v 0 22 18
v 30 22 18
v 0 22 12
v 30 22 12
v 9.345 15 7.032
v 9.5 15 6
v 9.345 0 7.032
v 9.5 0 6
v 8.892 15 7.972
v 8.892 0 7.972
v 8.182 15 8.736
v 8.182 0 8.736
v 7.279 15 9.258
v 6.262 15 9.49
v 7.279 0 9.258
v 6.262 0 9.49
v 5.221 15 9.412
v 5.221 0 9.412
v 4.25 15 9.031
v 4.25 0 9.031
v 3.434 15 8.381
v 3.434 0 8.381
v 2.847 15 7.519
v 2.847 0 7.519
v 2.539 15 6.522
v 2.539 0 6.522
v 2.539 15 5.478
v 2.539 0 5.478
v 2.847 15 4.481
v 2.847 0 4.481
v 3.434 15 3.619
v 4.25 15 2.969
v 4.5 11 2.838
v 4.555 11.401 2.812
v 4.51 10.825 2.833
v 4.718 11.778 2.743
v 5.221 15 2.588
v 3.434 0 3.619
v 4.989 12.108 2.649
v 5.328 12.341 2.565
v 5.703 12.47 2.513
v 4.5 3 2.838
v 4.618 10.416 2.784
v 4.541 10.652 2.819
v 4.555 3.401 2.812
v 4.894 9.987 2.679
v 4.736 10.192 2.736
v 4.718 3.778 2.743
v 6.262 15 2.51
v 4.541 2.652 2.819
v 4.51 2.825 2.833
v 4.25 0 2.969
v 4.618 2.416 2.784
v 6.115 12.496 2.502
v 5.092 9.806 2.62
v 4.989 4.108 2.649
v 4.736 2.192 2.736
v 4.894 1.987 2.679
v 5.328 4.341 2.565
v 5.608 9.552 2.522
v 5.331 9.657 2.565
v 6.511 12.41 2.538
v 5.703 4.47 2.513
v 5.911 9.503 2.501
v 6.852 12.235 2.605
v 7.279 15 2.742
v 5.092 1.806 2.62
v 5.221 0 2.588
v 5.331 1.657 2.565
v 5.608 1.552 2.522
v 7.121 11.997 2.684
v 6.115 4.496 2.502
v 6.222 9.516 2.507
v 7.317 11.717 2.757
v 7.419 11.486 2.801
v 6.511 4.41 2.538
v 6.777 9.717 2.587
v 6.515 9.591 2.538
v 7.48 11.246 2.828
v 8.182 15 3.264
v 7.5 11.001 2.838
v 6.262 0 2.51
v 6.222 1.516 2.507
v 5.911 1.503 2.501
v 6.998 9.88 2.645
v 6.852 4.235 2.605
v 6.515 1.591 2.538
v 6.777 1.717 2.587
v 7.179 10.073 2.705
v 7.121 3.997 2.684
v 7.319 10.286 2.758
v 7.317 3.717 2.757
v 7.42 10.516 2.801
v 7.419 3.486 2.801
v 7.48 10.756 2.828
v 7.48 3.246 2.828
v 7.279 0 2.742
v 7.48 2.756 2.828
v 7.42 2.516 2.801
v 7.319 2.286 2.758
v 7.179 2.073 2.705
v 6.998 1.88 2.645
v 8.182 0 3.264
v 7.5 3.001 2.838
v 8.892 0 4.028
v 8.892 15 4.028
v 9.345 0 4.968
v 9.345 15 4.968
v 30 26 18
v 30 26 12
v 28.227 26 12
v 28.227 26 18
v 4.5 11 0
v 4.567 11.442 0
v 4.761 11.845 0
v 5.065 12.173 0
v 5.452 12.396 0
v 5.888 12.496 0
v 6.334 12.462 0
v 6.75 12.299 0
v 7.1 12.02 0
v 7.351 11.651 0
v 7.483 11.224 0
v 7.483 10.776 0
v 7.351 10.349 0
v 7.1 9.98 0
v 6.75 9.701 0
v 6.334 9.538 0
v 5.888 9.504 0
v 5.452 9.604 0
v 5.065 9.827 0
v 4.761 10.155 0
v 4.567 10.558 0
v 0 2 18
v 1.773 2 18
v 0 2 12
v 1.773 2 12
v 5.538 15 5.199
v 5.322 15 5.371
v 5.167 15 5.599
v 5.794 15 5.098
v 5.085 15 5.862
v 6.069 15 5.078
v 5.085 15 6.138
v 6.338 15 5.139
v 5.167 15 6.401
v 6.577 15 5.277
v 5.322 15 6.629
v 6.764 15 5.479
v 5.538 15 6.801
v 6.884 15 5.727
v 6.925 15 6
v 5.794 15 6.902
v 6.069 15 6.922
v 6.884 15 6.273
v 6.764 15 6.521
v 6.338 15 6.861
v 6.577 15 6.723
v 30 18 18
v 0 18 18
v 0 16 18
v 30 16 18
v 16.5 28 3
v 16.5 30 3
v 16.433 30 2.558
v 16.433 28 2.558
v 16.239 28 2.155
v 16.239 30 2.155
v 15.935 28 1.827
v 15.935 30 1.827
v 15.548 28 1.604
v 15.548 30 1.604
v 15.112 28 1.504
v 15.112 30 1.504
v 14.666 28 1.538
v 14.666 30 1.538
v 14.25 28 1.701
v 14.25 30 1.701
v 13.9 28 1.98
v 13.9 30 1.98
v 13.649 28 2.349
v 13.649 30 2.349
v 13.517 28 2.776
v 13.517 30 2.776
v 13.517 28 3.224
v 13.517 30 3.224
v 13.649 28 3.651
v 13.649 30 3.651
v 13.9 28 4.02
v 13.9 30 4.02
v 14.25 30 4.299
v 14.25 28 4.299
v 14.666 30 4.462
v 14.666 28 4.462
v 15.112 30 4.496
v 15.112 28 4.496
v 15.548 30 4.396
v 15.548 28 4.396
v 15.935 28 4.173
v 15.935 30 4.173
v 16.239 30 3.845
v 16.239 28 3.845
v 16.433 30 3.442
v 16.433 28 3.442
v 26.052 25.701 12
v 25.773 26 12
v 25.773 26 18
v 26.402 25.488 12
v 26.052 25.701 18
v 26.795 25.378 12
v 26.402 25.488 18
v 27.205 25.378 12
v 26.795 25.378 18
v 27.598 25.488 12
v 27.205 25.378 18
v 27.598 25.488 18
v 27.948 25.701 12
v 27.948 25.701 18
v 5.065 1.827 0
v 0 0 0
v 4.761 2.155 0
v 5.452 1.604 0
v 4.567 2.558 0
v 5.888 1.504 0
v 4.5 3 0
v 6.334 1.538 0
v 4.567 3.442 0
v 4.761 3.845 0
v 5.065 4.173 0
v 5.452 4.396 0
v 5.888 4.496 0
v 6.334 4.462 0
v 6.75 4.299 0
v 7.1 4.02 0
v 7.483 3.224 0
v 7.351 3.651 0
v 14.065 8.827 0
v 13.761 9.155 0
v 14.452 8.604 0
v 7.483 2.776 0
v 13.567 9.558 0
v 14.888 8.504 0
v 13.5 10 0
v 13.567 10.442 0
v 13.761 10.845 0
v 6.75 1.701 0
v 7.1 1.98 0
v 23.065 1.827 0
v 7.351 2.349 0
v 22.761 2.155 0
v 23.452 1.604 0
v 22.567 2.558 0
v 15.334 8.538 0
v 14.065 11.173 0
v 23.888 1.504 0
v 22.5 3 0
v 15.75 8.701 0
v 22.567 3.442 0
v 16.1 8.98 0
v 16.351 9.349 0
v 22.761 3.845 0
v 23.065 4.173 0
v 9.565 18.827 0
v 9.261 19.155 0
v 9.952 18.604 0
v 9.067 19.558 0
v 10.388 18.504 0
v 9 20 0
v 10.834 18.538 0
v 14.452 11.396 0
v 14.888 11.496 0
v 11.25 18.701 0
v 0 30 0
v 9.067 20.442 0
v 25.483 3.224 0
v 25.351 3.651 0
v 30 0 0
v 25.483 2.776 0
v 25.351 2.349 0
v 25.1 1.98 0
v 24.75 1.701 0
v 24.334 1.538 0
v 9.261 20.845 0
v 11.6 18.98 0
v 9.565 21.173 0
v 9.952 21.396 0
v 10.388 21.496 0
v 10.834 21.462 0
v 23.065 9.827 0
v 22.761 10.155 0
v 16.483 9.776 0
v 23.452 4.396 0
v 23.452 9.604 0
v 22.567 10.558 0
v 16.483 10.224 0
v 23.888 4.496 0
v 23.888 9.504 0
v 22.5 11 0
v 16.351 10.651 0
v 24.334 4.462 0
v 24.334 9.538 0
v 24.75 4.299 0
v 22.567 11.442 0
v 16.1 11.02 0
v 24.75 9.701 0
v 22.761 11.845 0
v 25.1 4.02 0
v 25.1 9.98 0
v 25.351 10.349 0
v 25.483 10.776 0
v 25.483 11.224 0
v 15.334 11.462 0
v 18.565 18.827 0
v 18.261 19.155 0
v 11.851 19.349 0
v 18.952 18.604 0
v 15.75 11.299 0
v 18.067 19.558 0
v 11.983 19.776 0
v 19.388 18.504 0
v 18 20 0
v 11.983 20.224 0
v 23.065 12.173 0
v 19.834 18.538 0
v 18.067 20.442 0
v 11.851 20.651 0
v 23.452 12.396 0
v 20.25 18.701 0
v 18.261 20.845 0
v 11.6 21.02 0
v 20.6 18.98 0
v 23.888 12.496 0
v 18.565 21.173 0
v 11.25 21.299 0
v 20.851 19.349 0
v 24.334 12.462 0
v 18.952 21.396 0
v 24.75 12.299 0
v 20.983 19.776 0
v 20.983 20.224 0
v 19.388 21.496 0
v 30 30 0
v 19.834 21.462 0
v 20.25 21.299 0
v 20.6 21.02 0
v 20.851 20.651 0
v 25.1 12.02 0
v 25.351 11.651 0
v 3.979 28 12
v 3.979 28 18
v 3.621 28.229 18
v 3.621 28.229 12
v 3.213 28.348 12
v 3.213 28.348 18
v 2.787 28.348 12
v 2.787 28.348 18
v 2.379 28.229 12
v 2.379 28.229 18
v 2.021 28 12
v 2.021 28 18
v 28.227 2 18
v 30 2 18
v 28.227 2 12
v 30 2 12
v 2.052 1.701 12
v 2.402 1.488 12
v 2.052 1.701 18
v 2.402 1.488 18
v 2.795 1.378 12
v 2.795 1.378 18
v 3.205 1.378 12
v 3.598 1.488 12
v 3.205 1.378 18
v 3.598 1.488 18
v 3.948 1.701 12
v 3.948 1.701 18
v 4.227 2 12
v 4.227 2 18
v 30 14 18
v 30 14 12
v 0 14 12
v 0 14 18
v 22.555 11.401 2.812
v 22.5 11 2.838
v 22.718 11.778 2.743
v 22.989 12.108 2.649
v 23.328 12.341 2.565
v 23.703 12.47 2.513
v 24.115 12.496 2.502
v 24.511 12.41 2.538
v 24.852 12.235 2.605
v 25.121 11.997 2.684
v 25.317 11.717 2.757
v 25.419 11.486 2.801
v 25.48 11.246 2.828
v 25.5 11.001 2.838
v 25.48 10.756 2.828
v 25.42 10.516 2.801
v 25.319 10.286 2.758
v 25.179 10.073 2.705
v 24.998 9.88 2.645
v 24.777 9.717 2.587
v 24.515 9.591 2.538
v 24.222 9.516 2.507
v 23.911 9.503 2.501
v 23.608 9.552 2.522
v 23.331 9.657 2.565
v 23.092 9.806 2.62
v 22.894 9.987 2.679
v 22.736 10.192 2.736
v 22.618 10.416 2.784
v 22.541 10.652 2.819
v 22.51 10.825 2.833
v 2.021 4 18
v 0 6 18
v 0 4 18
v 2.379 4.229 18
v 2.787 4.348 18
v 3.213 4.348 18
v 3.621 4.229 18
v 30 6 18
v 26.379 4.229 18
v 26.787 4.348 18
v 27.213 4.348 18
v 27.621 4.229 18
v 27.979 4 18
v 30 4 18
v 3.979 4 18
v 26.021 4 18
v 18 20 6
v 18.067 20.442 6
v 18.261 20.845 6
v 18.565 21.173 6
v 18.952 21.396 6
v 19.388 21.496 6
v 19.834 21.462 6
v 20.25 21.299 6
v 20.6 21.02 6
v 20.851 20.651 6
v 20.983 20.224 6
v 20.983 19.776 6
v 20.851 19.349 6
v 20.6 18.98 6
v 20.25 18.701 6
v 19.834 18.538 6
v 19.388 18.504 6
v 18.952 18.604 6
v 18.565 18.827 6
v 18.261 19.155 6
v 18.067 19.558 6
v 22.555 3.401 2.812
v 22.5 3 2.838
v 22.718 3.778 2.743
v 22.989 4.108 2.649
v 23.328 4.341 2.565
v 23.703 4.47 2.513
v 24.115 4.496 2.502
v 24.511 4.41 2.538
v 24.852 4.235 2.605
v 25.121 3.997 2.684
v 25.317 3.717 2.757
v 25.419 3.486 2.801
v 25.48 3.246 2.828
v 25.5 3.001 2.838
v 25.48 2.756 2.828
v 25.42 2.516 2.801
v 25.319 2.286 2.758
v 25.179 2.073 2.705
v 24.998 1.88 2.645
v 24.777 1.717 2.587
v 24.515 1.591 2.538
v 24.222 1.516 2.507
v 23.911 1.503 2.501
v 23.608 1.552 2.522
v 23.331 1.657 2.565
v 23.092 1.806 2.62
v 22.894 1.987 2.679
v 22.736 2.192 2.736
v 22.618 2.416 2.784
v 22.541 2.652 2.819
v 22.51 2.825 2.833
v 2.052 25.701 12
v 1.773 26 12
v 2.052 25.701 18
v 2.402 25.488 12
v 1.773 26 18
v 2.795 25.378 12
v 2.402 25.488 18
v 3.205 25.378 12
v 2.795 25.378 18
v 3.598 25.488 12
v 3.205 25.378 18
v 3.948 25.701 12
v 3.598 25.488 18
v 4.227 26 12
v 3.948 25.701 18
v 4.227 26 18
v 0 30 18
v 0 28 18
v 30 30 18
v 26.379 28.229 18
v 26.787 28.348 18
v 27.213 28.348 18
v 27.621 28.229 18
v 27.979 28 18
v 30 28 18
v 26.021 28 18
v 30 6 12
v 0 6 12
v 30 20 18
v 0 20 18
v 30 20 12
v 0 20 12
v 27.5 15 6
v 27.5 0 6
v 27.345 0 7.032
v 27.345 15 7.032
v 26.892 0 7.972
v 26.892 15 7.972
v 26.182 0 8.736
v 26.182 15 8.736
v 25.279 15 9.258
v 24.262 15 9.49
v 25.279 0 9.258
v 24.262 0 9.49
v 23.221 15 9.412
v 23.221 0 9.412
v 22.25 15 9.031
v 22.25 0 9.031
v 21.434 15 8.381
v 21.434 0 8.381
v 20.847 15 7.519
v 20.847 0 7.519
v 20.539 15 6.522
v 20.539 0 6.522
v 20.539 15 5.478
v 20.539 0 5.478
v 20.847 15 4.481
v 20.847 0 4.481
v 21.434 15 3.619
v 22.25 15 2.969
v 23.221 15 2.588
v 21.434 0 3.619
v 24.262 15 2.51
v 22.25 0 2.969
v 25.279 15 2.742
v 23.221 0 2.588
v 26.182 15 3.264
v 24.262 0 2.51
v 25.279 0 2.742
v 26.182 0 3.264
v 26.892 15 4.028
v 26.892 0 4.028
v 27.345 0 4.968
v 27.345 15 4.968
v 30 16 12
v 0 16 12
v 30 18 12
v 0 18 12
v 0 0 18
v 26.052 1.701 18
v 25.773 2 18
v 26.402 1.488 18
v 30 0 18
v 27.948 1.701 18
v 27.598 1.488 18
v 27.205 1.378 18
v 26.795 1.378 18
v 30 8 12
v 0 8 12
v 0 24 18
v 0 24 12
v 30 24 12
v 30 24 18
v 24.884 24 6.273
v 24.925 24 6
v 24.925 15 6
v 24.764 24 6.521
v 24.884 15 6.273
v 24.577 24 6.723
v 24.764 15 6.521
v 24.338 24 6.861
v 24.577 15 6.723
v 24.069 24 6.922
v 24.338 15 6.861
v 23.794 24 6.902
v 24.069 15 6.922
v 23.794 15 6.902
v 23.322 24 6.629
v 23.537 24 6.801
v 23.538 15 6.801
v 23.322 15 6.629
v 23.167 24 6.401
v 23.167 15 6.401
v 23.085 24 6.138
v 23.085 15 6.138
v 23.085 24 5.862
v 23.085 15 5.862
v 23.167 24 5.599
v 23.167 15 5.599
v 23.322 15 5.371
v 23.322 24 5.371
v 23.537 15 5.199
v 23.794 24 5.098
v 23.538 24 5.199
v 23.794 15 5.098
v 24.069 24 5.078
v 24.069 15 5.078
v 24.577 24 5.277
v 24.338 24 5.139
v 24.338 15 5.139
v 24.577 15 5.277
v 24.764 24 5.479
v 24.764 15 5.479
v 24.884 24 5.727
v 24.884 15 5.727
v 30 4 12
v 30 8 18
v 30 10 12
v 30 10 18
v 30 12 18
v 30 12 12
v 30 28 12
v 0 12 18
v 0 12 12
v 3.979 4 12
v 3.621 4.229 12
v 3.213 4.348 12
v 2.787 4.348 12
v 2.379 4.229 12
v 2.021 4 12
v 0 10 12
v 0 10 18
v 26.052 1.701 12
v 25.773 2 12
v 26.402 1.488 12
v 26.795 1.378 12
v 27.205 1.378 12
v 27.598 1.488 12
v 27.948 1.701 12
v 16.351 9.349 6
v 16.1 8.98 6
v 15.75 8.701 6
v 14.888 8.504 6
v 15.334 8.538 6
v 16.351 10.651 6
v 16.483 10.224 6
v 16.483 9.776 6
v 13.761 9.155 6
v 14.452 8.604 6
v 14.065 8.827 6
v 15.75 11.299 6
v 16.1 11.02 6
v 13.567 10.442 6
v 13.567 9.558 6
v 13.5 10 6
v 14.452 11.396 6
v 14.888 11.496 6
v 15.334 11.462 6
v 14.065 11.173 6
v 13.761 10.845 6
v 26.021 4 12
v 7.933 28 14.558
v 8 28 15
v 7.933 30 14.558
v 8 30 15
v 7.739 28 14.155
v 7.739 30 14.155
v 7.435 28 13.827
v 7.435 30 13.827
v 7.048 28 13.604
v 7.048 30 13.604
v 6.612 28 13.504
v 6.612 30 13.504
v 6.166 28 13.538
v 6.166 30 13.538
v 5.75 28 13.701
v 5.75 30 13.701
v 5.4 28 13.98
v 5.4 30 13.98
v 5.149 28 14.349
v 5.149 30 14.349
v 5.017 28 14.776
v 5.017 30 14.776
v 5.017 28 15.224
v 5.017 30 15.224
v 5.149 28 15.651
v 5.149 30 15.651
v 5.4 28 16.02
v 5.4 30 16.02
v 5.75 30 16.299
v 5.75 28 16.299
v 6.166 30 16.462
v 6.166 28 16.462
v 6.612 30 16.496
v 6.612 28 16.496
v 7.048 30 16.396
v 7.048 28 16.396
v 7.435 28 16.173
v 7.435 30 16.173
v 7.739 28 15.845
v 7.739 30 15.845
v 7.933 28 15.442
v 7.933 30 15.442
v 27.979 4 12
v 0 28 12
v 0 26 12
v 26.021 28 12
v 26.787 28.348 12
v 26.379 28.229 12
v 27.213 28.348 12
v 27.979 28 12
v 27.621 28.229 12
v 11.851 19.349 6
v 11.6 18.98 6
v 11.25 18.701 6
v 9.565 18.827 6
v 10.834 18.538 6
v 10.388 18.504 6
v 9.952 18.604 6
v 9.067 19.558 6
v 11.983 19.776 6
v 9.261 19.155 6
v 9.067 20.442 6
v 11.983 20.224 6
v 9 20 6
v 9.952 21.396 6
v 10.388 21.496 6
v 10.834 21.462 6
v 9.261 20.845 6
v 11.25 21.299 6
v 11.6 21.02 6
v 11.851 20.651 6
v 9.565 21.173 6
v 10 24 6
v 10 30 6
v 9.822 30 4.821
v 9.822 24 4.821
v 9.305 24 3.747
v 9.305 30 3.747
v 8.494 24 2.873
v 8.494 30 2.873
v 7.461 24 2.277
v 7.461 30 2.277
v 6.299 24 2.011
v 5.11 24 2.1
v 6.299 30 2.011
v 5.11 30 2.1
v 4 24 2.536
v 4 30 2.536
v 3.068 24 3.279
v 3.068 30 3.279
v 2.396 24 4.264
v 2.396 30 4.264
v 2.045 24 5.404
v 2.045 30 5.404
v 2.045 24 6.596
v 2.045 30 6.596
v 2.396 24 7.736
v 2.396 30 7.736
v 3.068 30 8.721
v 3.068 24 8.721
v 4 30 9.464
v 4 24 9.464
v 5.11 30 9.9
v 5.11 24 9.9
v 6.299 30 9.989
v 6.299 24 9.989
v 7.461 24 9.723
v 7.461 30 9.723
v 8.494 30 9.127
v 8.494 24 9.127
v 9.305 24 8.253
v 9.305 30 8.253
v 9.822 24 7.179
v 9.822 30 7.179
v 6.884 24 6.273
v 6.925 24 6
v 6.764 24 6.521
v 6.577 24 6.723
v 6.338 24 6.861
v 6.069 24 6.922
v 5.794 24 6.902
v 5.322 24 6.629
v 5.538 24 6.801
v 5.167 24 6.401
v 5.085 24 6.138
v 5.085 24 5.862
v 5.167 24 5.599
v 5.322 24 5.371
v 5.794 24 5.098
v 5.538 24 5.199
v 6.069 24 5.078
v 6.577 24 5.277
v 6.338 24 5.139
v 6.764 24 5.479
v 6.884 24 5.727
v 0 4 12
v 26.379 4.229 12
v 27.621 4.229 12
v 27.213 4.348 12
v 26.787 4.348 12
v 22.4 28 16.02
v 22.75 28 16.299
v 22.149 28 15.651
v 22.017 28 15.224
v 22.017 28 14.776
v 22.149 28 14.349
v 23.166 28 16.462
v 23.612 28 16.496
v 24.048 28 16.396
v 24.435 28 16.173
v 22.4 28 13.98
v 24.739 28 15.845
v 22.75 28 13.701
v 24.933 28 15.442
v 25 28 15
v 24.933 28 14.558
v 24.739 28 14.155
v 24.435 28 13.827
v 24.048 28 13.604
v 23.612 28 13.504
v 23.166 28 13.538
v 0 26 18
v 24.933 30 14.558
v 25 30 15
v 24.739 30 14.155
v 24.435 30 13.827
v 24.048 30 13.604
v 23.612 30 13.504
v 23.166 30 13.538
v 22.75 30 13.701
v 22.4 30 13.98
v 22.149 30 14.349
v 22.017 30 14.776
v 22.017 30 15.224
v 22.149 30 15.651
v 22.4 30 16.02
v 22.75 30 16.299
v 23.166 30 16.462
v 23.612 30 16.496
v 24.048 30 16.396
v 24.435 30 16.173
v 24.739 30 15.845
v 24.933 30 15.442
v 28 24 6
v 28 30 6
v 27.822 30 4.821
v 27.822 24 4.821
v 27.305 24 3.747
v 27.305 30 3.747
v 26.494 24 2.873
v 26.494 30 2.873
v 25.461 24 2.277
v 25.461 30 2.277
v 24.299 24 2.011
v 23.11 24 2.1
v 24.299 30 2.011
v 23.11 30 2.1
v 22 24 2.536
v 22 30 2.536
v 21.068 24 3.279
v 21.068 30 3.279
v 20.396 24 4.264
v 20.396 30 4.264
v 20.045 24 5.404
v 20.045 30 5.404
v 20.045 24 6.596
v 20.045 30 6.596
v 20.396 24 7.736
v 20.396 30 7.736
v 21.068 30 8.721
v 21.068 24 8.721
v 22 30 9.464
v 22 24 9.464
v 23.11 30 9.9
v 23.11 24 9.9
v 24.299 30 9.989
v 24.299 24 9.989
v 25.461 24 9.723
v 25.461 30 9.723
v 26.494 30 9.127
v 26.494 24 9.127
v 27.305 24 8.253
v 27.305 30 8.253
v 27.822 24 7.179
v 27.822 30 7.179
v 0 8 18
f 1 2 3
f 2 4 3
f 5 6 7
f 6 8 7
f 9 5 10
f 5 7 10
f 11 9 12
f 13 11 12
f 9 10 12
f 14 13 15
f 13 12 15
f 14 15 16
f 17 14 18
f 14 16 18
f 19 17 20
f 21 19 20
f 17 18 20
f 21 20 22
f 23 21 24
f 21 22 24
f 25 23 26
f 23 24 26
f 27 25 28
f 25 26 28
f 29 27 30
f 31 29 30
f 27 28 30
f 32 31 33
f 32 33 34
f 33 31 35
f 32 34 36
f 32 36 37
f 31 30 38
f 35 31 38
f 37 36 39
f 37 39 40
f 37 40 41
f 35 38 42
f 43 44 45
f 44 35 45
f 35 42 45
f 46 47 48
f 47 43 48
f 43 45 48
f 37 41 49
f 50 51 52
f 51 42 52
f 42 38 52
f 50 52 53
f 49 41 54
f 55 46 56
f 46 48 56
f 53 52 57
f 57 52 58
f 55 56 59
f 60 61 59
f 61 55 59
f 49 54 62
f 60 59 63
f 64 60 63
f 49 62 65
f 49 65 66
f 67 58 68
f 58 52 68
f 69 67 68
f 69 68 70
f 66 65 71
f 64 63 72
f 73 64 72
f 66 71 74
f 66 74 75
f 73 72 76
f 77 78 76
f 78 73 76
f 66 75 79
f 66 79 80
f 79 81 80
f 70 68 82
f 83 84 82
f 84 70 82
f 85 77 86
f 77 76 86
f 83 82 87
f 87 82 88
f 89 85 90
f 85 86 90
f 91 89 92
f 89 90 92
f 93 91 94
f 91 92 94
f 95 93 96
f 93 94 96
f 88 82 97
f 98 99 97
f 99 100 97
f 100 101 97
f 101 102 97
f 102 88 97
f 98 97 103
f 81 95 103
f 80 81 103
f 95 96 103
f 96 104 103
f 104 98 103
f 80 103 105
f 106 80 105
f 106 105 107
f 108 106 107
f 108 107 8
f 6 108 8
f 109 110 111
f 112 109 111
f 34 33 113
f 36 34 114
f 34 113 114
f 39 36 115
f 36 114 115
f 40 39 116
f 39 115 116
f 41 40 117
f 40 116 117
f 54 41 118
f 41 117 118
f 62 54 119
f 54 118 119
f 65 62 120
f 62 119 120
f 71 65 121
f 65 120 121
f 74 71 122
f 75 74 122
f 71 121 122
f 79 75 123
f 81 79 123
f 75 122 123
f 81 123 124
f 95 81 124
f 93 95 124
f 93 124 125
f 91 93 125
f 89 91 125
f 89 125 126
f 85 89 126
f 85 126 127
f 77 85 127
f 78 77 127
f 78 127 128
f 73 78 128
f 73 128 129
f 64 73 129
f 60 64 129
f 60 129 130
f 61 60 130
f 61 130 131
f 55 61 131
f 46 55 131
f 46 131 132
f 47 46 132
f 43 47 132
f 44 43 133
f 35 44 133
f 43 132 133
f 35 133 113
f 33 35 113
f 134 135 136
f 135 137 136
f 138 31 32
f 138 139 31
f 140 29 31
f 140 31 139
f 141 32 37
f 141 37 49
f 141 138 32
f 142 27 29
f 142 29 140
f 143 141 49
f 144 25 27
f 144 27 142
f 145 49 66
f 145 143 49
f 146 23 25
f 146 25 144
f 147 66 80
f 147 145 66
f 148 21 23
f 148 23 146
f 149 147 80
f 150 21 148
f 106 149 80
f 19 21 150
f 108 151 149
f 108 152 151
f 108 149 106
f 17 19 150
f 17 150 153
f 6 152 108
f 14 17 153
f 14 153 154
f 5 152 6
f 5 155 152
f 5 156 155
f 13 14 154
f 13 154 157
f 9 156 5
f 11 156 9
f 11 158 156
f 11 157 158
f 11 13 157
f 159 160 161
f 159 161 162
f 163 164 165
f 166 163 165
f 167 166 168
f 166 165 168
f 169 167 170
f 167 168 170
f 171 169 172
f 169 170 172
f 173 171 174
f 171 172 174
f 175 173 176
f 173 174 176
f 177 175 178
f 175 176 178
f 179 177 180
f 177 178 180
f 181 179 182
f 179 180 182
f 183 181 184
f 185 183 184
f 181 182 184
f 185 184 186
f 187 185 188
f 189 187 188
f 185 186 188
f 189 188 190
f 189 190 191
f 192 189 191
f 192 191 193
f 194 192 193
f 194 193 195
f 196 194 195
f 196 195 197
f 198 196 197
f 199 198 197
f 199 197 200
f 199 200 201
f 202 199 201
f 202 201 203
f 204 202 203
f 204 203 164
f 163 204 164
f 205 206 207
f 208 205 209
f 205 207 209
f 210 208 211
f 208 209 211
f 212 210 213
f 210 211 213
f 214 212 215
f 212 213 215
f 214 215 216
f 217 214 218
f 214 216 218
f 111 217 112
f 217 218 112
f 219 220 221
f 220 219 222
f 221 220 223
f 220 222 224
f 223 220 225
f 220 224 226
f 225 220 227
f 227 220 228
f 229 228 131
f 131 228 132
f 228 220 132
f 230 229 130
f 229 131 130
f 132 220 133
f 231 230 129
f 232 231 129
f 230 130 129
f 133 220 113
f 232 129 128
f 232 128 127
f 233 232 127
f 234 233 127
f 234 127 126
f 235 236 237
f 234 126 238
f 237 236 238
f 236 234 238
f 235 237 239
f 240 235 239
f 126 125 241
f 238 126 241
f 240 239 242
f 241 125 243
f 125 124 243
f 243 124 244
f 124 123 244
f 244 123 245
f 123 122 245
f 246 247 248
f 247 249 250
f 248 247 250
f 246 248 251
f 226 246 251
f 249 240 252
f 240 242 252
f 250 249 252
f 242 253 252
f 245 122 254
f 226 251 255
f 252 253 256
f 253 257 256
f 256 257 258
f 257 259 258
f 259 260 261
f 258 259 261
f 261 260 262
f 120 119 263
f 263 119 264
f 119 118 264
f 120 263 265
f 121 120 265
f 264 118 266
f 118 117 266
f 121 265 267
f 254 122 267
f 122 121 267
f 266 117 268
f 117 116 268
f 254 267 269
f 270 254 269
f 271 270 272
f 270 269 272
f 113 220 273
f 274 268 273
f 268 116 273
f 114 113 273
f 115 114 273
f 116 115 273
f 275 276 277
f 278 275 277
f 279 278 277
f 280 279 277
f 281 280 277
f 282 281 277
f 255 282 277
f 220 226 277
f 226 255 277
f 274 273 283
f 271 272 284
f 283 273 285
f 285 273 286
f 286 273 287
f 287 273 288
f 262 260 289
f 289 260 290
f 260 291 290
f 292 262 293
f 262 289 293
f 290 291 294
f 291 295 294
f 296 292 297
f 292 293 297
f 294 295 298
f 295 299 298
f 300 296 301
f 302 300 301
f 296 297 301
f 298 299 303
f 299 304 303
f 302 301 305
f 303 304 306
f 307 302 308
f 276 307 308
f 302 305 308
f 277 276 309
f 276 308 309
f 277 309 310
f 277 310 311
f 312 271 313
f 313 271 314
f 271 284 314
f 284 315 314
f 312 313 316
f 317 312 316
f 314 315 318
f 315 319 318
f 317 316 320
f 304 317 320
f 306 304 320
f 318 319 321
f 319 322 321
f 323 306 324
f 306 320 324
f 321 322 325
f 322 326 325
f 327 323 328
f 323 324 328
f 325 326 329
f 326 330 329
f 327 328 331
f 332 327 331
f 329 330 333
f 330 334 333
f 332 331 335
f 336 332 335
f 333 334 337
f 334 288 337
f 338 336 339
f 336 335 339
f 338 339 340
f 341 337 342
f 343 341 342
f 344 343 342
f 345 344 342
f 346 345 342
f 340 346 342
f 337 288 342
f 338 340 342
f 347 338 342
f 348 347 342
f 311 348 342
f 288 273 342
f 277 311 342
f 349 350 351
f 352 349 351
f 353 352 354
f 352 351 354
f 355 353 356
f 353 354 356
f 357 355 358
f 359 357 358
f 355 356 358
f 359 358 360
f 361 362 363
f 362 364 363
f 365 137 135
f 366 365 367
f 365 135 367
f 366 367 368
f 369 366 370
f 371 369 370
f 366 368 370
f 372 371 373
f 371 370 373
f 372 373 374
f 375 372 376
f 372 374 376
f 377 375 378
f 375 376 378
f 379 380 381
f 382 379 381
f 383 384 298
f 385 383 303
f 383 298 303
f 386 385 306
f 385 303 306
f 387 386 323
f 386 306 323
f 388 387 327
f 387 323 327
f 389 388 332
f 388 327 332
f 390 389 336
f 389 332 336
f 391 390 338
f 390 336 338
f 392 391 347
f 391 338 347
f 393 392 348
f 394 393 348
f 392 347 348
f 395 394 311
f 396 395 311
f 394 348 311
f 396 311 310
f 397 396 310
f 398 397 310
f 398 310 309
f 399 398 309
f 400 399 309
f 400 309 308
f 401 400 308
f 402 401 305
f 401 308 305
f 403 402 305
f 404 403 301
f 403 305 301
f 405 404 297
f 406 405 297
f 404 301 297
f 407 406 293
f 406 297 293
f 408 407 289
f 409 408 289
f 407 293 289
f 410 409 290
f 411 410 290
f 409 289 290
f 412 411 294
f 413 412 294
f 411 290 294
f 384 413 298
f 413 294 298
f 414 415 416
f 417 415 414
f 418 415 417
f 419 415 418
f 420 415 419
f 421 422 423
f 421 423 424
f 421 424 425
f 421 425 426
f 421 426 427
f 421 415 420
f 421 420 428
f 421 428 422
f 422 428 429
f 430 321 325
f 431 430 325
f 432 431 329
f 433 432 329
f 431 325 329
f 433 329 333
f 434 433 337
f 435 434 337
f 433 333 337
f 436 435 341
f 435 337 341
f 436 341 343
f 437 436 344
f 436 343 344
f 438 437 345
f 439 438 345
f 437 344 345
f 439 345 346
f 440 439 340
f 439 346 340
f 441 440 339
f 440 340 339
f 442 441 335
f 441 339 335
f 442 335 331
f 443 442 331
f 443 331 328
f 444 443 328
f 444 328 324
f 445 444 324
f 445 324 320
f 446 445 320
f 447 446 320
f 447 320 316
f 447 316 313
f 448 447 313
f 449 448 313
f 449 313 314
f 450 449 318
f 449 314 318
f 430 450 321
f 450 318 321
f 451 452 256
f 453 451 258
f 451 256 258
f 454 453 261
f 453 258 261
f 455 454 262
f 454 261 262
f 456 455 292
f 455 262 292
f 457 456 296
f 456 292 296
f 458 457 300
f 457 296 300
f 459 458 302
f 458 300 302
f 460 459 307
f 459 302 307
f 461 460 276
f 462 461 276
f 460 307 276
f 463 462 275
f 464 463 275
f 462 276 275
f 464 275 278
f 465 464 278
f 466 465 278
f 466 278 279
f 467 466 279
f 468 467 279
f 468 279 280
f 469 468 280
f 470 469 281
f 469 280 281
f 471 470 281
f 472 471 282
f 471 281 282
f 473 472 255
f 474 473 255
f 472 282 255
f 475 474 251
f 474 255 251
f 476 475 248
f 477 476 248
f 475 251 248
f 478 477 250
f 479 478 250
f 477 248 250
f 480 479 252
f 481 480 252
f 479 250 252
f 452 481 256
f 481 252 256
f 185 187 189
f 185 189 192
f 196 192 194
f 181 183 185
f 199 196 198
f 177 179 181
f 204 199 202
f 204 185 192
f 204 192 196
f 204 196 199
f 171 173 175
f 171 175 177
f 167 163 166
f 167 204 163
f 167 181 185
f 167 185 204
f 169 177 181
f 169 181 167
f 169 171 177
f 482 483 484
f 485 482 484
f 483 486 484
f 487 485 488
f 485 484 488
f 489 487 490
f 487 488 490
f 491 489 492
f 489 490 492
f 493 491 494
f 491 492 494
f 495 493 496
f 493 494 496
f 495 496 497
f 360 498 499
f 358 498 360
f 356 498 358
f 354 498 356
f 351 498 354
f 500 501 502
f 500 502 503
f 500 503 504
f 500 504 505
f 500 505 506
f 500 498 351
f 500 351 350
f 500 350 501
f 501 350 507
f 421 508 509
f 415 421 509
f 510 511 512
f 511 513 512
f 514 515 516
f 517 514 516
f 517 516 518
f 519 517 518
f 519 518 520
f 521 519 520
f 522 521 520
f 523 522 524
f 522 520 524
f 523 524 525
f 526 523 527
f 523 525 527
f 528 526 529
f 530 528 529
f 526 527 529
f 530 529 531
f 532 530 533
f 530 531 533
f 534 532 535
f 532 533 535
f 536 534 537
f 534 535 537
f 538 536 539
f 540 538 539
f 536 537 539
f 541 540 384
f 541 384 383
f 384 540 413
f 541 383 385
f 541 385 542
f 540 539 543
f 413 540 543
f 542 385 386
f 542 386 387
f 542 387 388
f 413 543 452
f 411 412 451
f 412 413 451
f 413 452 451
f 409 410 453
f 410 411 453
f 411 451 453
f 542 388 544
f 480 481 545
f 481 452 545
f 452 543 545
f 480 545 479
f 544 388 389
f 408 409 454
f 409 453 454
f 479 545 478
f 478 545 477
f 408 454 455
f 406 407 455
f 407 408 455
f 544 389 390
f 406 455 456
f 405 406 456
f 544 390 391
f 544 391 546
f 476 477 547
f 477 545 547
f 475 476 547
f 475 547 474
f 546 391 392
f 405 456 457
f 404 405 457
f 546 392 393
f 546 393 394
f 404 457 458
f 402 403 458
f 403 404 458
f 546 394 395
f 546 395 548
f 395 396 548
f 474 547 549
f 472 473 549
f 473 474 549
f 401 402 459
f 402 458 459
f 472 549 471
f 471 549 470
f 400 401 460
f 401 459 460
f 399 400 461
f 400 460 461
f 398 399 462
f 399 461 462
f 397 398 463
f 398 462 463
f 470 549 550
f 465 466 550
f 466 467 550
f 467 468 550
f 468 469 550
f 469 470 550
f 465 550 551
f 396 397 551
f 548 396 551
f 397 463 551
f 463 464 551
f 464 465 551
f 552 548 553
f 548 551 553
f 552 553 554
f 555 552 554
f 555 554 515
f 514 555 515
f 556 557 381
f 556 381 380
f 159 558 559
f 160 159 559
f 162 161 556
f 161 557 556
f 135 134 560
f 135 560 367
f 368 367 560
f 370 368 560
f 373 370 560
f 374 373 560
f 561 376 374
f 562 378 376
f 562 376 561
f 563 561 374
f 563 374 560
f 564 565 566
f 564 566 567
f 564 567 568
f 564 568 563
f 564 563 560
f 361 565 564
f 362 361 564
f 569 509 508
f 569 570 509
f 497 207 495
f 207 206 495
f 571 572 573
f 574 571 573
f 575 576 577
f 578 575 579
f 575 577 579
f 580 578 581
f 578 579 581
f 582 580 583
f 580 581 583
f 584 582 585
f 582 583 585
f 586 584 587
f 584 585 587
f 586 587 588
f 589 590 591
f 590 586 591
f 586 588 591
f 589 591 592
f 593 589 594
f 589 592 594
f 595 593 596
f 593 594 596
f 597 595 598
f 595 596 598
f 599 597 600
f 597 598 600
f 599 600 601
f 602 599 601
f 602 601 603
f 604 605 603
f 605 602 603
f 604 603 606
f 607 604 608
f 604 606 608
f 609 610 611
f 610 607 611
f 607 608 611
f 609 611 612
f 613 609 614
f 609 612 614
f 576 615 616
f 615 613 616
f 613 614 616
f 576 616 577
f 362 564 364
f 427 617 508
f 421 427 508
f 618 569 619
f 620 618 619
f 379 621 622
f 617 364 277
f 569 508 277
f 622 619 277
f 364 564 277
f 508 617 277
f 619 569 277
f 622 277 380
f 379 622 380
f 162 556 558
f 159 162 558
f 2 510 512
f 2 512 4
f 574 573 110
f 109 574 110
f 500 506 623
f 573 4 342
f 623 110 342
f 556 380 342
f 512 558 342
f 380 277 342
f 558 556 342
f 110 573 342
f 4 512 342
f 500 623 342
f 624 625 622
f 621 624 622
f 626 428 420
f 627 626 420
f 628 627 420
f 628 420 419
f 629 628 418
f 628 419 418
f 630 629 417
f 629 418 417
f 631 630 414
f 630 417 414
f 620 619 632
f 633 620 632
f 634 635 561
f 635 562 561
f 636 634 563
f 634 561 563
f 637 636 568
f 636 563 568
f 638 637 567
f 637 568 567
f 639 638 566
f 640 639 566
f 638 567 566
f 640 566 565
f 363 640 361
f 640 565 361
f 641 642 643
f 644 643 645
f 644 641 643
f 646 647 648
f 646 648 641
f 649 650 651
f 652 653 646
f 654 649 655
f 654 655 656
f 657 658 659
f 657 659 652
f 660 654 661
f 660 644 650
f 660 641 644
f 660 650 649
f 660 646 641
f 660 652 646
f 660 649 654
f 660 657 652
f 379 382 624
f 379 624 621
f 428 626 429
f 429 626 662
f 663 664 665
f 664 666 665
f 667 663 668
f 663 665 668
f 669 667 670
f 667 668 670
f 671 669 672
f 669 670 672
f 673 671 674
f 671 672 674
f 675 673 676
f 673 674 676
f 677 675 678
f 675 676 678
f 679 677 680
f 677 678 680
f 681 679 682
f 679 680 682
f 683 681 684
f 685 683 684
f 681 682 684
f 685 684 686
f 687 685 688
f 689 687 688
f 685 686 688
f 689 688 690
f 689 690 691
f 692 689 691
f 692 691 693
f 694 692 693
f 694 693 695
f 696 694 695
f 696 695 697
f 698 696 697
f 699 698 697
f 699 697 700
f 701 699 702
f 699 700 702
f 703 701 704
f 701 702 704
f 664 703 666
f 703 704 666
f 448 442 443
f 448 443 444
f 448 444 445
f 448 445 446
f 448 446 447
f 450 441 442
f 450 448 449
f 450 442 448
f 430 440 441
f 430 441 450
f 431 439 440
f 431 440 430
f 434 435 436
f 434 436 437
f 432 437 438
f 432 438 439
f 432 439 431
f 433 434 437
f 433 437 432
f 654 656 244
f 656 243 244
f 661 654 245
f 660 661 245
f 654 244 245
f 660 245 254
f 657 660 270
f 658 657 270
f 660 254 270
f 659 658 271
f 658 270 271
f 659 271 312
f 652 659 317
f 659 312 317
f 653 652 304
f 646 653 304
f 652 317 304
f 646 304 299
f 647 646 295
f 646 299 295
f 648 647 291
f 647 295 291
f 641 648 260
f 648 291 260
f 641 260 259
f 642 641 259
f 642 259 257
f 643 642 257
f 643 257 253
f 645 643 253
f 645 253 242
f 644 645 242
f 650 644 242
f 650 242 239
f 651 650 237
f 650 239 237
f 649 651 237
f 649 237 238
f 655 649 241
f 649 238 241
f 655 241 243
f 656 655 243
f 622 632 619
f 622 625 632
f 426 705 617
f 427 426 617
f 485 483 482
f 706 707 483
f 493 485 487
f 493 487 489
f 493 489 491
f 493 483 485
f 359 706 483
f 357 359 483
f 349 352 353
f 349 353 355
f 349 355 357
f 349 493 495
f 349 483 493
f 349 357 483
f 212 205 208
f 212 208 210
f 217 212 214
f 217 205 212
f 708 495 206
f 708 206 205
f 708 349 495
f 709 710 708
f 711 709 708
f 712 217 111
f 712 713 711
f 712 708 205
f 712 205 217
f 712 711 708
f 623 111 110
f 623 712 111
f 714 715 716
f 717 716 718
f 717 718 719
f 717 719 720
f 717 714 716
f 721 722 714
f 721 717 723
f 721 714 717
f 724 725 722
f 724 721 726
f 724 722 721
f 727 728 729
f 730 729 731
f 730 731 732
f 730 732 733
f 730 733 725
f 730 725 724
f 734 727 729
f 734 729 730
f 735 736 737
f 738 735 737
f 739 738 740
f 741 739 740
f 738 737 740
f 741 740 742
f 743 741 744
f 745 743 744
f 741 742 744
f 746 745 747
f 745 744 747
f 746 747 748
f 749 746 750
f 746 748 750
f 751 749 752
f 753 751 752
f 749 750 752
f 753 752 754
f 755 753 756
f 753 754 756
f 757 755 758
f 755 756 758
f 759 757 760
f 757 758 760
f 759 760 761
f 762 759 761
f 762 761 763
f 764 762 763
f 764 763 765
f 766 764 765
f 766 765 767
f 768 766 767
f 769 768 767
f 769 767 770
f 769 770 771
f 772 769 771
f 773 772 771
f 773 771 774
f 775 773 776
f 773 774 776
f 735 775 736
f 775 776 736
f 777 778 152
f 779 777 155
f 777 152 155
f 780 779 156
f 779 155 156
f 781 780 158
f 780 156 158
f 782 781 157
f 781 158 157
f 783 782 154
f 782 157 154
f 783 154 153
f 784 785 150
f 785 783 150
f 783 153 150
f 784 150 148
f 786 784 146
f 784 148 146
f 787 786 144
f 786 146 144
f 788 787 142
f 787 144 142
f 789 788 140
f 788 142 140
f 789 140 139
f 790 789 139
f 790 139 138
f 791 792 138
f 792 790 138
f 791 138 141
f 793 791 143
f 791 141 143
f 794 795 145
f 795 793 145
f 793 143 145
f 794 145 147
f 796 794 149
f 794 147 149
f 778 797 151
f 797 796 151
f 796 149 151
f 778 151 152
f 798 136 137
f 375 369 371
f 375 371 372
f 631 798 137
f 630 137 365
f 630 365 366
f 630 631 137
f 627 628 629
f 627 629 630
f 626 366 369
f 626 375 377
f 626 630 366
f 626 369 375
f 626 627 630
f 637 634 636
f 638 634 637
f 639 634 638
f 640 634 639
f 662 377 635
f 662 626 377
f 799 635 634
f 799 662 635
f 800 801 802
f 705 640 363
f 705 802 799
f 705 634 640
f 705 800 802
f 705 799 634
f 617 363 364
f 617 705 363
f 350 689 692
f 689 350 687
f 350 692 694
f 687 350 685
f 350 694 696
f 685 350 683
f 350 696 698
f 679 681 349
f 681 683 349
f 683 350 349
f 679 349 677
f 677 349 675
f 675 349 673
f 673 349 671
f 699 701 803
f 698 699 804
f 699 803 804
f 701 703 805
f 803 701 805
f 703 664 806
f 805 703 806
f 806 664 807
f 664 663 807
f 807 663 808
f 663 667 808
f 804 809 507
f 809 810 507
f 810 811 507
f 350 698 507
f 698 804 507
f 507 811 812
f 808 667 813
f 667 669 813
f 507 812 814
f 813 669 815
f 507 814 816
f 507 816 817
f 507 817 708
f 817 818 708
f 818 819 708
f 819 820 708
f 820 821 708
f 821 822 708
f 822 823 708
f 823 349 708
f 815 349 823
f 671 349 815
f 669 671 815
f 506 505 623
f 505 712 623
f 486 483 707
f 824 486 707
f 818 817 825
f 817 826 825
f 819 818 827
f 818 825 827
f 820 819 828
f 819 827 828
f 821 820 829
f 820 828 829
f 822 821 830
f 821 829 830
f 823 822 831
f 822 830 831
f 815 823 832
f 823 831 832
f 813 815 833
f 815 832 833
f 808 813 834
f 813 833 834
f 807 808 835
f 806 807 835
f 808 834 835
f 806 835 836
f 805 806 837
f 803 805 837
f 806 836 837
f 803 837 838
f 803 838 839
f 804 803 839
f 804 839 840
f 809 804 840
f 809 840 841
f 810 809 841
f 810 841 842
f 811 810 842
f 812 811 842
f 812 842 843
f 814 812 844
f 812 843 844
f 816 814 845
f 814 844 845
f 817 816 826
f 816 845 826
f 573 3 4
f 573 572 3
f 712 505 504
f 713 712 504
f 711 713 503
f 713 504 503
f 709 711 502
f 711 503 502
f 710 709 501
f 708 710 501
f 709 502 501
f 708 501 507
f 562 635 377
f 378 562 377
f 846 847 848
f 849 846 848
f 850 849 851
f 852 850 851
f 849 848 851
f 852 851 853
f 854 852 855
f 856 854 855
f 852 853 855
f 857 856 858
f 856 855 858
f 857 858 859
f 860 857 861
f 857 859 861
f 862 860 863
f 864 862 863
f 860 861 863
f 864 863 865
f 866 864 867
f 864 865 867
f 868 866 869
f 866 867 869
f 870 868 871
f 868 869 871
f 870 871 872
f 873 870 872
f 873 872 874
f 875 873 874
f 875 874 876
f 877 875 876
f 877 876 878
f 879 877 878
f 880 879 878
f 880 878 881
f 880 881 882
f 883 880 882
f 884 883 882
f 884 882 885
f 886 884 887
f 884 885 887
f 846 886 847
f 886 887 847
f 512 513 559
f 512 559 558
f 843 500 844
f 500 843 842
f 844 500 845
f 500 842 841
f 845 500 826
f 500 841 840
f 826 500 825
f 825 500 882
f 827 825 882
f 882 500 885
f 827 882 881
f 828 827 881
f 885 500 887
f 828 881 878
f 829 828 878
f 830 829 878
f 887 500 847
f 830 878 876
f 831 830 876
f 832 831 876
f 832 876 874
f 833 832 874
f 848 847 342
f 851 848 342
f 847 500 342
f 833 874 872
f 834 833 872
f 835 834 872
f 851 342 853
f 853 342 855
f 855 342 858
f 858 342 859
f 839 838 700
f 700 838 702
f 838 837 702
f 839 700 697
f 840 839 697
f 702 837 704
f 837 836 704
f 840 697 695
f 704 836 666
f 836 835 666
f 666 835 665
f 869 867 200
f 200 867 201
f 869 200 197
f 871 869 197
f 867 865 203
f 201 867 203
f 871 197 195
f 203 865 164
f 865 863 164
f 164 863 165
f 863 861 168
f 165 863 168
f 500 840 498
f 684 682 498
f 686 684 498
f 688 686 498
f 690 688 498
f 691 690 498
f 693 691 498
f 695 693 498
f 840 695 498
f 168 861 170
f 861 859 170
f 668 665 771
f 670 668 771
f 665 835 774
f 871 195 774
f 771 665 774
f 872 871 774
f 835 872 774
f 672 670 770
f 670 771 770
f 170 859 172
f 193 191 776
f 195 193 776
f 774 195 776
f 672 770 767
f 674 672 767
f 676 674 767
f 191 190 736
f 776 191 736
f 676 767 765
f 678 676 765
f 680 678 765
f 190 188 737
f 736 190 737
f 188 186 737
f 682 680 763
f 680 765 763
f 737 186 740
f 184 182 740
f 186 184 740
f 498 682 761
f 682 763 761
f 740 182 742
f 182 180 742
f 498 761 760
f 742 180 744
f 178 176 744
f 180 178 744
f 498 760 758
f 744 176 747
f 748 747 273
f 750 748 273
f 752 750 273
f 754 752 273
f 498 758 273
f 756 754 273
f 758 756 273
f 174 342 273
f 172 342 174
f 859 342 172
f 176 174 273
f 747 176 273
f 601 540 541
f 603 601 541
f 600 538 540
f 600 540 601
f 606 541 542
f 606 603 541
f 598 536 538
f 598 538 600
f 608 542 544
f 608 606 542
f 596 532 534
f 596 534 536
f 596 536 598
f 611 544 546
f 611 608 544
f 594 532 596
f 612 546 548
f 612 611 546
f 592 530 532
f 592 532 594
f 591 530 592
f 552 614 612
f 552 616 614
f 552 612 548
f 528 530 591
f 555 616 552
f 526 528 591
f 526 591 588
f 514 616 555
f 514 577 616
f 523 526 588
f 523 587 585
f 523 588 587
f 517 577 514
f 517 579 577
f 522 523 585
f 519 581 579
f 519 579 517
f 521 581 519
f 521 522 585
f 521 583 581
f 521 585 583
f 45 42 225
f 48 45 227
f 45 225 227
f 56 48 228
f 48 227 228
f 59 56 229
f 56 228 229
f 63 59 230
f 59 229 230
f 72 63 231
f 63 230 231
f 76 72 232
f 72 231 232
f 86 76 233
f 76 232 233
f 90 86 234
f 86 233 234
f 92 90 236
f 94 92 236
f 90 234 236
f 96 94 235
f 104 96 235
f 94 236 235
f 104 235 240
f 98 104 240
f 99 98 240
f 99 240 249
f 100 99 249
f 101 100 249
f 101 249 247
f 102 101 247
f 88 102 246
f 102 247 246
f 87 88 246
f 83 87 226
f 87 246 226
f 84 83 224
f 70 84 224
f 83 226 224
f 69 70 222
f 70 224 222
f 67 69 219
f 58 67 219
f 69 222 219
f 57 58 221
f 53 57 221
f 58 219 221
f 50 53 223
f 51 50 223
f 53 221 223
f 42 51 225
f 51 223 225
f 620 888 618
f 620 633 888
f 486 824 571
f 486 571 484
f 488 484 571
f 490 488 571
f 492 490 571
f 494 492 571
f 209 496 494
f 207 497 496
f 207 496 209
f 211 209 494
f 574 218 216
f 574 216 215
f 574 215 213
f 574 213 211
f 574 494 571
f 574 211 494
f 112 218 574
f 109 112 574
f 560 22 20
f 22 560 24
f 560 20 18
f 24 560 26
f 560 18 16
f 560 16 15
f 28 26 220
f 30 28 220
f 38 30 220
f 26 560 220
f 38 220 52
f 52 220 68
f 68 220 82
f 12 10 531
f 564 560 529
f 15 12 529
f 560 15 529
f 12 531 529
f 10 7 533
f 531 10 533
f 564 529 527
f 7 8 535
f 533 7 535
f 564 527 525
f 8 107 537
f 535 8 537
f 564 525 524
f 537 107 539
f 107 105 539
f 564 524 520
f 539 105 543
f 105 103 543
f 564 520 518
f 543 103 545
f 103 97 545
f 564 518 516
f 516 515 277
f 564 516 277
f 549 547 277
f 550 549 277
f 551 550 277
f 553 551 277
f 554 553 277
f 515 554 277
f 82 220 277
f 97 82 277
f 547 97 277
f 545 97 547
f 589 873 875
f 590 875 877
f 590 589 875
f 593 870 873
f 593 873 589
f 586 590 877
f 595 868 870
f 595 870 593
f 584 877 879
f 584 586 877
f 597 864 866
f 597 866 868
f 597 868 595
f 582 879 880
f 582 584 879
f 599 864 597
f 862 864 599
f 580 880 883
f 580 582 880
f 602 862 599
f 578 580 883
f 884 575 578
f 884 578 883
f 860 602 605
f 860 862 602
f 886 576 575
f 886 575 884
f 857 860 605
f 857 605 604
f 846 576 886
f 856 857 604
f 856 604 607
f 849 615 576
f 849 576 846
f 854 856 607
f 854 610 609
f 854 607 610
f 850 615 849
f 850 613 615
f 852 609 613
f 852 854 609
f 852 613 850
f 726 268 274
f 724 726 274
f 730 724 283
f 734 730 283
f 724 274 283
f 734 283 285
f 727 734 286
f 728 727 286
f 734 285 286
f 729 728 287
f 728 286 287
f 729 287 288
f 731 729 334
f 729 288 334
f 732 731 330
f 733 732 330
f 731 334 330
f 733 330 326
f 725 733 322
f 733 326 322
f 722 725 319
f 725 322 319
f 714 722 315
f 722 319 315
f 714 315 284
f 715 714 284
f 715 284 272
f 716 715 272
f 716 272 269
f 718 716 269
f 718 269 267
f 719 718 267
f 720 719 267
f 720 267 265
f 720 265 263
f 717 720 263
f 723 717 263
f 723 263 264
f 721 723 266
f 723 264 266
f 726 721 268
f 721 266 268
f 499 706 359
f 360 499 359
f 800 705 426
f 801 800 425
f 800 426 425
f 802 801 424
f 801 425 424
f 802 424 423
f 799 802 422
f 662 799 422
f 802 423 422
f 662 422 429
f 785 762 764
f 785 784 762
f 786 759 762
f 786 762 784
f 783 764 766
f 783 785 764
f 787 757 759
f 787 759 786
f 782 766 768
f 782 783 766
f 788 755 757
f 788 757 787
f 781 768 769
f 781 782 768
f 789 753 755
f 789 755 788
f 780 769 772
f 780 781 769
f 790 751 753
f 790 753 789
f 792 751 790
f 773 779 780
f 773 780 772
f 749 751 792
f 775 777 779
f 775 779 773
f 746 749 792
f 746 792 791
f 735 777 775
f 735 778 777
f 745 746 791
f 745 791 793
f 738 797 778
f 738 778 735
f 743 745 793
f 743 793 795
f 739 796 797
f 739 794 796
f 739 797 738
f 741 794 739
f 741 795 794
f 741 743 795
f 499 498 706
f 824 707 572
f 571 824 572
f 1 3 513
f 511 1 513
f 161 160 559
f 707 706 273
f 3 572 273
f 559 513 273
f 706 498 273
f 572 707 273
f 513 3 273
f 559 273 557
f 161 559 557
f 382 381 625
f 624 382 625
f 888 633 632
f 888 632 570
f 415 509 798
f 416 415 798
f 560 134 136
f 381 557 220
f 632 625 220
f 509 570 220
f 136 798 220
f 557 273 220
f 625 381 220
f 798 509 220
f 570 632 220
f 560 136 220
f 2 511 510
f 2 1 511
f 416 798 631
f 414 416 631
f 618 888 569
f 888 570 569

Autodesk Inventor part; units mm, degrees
ref_plane "YZ Plane" through (0, 0, 0) normal (1, 0, 0) x (0, 1, 0)
ref_plane "XZ Plane" through (0, 0, 0) normal (0, 1, 0) x (-1, 0, 0)
ref_plane "XY Plane" through (0, 0, 0) normal (0, 0, 1) x (1, 0, 0)
sketch "Sketch1" plane through (0, 0, 0) normal (0, 0, 1) x (1, 0, 0)
  line L0 (0, 0) -> (30, 0)
  line L1 (30, 0) -> (30, 30)
  line L2 (30, 30) -> (0, 30)
  line L3 (0, 30) -> (0, 0)
  dimension "d0" = 30
  dimension "d1" = 30
extrude "Extrusion1" add sketch "Sketch1" along normal blind 12
sketch "Sketch2" plane through (0, 0, 12) normal (0, 0, 1) x (1, 0, 0)
  line L0 (30, 0) -> (30, 30) projected
  line L1 (30, 30) -> (0, 30) projected
  line L2 (0, 30) -> (0, 0) projected
  line L3 (0, 28) -> (30, 28)
  dimension "d7" = 2
extrude "Extrusion2" add sketch "Sketch2" along normal blind 6
pattern_linear "Rectangular Pattern1" count 8 spacing 4 along (0, -1, 0) of "Extrusion2"
sketch "Sketch3" plane through (0, 0, 0) normal (0, -1, 0) x (1, 0, 0)
  line L0 (0, 0) -> (30, 0) projected
  line L1 (0, 0) -> (0, 18) projected
  circle A0 centre (6, 6) radius 3.5
  circle A1 centre (24, 6) radius 3.5
  dimension "d11" = 18
  dimension "d12" = 7
  dimension "d13" = 6
  dimension "d14" = 6
extrude "Extrusion3" cut sketch "Sketch3" against normal blind 15
sketch "Sketch4" plane through (24, 15, 6) normal (0, -1, 0) x (1, 0, 0)
  circle A0 centre (0, 0) radius 3.5 projected
  circle A1 centre (-18, 0) radius 3.5 projected
  circle A2 centre (-18, 0) radius 0.925
  circle A3 centre (0, 0) radius 0.925
  point P0 (-24, -6)
  dimension "d17" = 1.85
  dimension "d18" = 1.85
extrude "Extrusion4" cut sketch "Sketch4" against normal up to next contours A2 | A3
sketch "Sketch5" plane through (0, 30, 0) normal (0, 1, 0) x (1, 0, 0)
  line L0 (30, -18) -> (0, -18) projected
  circle A0 centre (23.5, -15) radius 1.5
  circle A1 centre (6.5, -15) radius 1.5
  line L1 (30, 0) -> (30, -18) projected
  circle A2 centre (15, -3) radius 1.5
  dimension "d21" = 3
  dimension "d22" = 3
  dimension "d87" = 17
  dimension "d88" = 6.5
  dimension "d89" = 3
  dimension "d90" = 8.5
  dimension "d91" = 12
extrude "Extrusion5" cut sketch "Sketch5" against normal up to surface (2 mm away)
thread "Thread1" size "M3x0.5" class "6H" standard "ANSI Metric M Profile" full length
thread "Thread2" size "M3x0.5" class "6H" standard "ANSI Metric M Profile" full length
sketch "Sketch6" plane through (0, 0, 18) normal (0, 0, 1) x (1, 0, 0)
  line L0 (30, 28) -> (30, 30)
  line L1 (30, 26) -> (0, 26)
  line L2 (0, 26) -> (0, 24)
  line L3 (0, 24) -> (30, 24)
  line L4 (30, 24) -> (30, 26)
  line L5 (30, 22) -> (0, 22)
  line L6 (0, 22) -> (0, 20)
  line L7 (0, 20) -> (30, 20)
  line L8 (30, 20) -> (30, 22)
  line L9 (30, 18) -> (0, 18)
  line L10 (0, 18) -> (0, 16)
  line L11 (0, 16) -> (30, 16)
  line L12 (30, 16) -> (30, 18)
  line L13 (30, 14) -> (0, 14)
  line L14 (0, 14) -> (0, 12)
  line L15 (0, 12) -> (30, 12)
  line L16 (30, 12) -> (30, 14)
  line L17 (30, 10) -> (0, 10)
  line L18 (0, 10) -> (0, 8)
  line L19 (0, 8) -> (30, 8)
  line L20 (30, 8) -> (30, 10)
  line L21 (30, 6) -> (0, 6)
  line L22 (0, 6) -> (0, 4)
  line L23 (0, 4) -> (30, 4)
  line L24 (30, 4) -> (30, 6)
  line L25 (30, 2) -> (0, 2)
  line L26 (0, 2) -> (0, 0)
  line L27 (0, 0) -> (30, 0)
  line L28 (30, 0) -> (30, 2)
  circle A0 centre (3, 26.8635) radius 1.5
  circle A1 centre (27, 26.8635) radius 1.5
  circle A2 centre (27, 2.8635) radius 1.5
  circle A3 centre (3, 2.8635) radius 1.5
  point P0 (0, 0)
extrude "Extrusion6" cut sketch "Sketch6" against normal up to surface (6 mm away) contours A1 L1 | L1 A1 | A0 L1 | L1 A0 | A2 L25 L23 | L23 A2 | A3 L23 | L23 A3 L25 | L25 A3 | L25 A2
thread "Thread3" size "M3x0.5" class "6H" standard "ANSI Metric M Profile" full length
thread "Thread4" size "M3x0.5" class "6H" standard "ANSI Metric M Profile" full length
thread "Thread5" size "M3x0.5" class "6H" standard "ANSI Metric M Profile" full length
thread "Thread6" size "M3x0.5" class "6H" standard "ANSI Metric M Profile" full length
thread "Thread7" size "M3x0.5" class "6H" standard "ANSI Metric M Profile" full length
thread "Thread8" size "M3x0.5" class "6H" standard "ANSI Metric M Profile" full length
thread "Thread9" size "M3x0.5" class "6H" standard "ANSI Metric M Profile" full length
thread "Thread10" size "M3x0.5" class "6H" standard "ANSI Metric M Profile" full length
sketch "Sketch7" plane through (0, 30, 0) normal (0, 1, 0) x (1, 0, 0)
  circle A0 centre (24, -6) radius 0.925 projected
  circle A1 centre (6, -6) radius 0.925 projected
  circle A2 centre (24, -6) radius 0.925 projected
  circle A3 centre (24, -6) radius 4
  circle A4 centre (6, -6) radius 4
  dimension "d52" = 8
extrude "Extrusion7" cut sketch "Sketch7" against normal blind 6
sketch "Sketch8" plane through (0, 0, 0) normal (0, 0, -1) x (-1, 0, 0)
  line L0 (0, 0) -> (-30, 0) projected
  circle A0 centre (-24, 3) radius 1.5
  circle A1 centre (-24, 11) radius 1.5
  circle A2 centre (-6, 11) radius 1.5
  circle A3 centre (-6, 3) radius 1.5
  line L1 (-20.5, 15) -> (-27.5, 15) projected
  line L2 (-20.5, 0) -> (-27.5, 0) projected
  line L3 (-2.5, 15) -> (-9.5, 15) projected
  line L4 (-2.5, 0) -> (-9.5, 0) projected
  dimension "d55" = 3
  dimension "d56" = 8
  dimension "d57" = 3.5
  dimension "d58" = 3.5
  dimension "d59" = 3
extrude "Extrusion8" cut sketch "Sketch8" against normal up to next
thread "Thread11" size "M3x0.5" class "6H" standard "ANSI Metric M Profile" full length
thread "Thread12" size "M3x0.5" class "6H" standard "ANSI Metric M Profile" full length
thread "Thread13" size "M3x0.5" class "6H" standard "ANSI Metric M Profile" full length
thread "Thread14" size "M3x0.5" class "6H" standard "ANSI Metric M Profile" full length
sketch "Sketch9" plane through (0, 0, 0) normal (0, 0, -1) x (-1, 0, 0)
  line L0 (-30, 0) -> (-30, 30) projected
  circle A0 centre (-15, 10) radius 1.5
  circle A1 centre (-19.5, 20) radius 1.5
  circle A2 centre (-10.5, 20) radius 1.5
  line L1 (0, 22) -> (-30, 22) projected
  line L2 (0, 0) -> (-30, 0) projected
  dimension "d70" = 3
  dimension "d73" = 10.5
  dimension "d75" = 10
  dimension "d84" = 19.5
  dimension "d85" = 15
  dimension "d86" = 20
extrude "Extrusion9" cut sketch "Sketch9" against normal blind 6
thread "Thread15" size "M3x0.5" class "6H" standard "ANSI Metric M Profile" full length
thread "Thread16" size "M3x0.5" class "6H" standard "ANSI Metric M Profile" full length
thread "Thread17" size "M3x0.5" class "6H" standard "ANSI Metric M Profile" full length
properties part number "ChimeraHeatsink" material "Aluminum 6061"
